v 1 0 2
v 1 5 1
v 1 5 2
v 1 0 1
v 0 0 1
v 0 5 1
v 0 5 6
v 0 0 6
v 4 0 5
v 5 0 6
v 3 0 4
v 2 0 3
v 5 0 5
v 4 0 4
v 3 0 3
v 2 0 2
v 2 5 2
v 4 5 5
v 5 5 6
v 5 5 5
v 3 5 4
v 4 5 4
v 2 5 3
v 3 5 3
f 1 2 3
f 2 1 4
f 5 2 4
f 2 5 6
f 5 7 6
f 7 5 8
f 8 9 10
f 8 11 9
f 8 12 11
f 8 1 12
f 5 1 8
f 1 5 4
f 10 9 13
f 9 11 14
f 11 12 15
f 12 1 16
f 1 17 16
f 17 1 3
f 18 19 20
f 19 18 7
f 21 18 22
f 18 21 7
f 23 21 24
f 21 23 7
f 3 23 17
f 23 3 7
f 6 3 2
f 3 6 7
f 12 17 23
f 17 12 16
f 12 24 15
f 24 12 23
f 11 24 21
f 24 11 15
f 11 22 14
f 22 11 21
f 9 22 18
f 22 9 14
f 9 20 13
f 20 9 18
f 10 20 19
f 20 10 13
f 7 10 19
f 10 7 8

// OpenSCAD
for (length=[1:5], width=[1:5])
    {
//    index=width/5; //will not work
    assign(index=width/5)
    translate([0,0,length]) cube([length,width,index]);
    }
